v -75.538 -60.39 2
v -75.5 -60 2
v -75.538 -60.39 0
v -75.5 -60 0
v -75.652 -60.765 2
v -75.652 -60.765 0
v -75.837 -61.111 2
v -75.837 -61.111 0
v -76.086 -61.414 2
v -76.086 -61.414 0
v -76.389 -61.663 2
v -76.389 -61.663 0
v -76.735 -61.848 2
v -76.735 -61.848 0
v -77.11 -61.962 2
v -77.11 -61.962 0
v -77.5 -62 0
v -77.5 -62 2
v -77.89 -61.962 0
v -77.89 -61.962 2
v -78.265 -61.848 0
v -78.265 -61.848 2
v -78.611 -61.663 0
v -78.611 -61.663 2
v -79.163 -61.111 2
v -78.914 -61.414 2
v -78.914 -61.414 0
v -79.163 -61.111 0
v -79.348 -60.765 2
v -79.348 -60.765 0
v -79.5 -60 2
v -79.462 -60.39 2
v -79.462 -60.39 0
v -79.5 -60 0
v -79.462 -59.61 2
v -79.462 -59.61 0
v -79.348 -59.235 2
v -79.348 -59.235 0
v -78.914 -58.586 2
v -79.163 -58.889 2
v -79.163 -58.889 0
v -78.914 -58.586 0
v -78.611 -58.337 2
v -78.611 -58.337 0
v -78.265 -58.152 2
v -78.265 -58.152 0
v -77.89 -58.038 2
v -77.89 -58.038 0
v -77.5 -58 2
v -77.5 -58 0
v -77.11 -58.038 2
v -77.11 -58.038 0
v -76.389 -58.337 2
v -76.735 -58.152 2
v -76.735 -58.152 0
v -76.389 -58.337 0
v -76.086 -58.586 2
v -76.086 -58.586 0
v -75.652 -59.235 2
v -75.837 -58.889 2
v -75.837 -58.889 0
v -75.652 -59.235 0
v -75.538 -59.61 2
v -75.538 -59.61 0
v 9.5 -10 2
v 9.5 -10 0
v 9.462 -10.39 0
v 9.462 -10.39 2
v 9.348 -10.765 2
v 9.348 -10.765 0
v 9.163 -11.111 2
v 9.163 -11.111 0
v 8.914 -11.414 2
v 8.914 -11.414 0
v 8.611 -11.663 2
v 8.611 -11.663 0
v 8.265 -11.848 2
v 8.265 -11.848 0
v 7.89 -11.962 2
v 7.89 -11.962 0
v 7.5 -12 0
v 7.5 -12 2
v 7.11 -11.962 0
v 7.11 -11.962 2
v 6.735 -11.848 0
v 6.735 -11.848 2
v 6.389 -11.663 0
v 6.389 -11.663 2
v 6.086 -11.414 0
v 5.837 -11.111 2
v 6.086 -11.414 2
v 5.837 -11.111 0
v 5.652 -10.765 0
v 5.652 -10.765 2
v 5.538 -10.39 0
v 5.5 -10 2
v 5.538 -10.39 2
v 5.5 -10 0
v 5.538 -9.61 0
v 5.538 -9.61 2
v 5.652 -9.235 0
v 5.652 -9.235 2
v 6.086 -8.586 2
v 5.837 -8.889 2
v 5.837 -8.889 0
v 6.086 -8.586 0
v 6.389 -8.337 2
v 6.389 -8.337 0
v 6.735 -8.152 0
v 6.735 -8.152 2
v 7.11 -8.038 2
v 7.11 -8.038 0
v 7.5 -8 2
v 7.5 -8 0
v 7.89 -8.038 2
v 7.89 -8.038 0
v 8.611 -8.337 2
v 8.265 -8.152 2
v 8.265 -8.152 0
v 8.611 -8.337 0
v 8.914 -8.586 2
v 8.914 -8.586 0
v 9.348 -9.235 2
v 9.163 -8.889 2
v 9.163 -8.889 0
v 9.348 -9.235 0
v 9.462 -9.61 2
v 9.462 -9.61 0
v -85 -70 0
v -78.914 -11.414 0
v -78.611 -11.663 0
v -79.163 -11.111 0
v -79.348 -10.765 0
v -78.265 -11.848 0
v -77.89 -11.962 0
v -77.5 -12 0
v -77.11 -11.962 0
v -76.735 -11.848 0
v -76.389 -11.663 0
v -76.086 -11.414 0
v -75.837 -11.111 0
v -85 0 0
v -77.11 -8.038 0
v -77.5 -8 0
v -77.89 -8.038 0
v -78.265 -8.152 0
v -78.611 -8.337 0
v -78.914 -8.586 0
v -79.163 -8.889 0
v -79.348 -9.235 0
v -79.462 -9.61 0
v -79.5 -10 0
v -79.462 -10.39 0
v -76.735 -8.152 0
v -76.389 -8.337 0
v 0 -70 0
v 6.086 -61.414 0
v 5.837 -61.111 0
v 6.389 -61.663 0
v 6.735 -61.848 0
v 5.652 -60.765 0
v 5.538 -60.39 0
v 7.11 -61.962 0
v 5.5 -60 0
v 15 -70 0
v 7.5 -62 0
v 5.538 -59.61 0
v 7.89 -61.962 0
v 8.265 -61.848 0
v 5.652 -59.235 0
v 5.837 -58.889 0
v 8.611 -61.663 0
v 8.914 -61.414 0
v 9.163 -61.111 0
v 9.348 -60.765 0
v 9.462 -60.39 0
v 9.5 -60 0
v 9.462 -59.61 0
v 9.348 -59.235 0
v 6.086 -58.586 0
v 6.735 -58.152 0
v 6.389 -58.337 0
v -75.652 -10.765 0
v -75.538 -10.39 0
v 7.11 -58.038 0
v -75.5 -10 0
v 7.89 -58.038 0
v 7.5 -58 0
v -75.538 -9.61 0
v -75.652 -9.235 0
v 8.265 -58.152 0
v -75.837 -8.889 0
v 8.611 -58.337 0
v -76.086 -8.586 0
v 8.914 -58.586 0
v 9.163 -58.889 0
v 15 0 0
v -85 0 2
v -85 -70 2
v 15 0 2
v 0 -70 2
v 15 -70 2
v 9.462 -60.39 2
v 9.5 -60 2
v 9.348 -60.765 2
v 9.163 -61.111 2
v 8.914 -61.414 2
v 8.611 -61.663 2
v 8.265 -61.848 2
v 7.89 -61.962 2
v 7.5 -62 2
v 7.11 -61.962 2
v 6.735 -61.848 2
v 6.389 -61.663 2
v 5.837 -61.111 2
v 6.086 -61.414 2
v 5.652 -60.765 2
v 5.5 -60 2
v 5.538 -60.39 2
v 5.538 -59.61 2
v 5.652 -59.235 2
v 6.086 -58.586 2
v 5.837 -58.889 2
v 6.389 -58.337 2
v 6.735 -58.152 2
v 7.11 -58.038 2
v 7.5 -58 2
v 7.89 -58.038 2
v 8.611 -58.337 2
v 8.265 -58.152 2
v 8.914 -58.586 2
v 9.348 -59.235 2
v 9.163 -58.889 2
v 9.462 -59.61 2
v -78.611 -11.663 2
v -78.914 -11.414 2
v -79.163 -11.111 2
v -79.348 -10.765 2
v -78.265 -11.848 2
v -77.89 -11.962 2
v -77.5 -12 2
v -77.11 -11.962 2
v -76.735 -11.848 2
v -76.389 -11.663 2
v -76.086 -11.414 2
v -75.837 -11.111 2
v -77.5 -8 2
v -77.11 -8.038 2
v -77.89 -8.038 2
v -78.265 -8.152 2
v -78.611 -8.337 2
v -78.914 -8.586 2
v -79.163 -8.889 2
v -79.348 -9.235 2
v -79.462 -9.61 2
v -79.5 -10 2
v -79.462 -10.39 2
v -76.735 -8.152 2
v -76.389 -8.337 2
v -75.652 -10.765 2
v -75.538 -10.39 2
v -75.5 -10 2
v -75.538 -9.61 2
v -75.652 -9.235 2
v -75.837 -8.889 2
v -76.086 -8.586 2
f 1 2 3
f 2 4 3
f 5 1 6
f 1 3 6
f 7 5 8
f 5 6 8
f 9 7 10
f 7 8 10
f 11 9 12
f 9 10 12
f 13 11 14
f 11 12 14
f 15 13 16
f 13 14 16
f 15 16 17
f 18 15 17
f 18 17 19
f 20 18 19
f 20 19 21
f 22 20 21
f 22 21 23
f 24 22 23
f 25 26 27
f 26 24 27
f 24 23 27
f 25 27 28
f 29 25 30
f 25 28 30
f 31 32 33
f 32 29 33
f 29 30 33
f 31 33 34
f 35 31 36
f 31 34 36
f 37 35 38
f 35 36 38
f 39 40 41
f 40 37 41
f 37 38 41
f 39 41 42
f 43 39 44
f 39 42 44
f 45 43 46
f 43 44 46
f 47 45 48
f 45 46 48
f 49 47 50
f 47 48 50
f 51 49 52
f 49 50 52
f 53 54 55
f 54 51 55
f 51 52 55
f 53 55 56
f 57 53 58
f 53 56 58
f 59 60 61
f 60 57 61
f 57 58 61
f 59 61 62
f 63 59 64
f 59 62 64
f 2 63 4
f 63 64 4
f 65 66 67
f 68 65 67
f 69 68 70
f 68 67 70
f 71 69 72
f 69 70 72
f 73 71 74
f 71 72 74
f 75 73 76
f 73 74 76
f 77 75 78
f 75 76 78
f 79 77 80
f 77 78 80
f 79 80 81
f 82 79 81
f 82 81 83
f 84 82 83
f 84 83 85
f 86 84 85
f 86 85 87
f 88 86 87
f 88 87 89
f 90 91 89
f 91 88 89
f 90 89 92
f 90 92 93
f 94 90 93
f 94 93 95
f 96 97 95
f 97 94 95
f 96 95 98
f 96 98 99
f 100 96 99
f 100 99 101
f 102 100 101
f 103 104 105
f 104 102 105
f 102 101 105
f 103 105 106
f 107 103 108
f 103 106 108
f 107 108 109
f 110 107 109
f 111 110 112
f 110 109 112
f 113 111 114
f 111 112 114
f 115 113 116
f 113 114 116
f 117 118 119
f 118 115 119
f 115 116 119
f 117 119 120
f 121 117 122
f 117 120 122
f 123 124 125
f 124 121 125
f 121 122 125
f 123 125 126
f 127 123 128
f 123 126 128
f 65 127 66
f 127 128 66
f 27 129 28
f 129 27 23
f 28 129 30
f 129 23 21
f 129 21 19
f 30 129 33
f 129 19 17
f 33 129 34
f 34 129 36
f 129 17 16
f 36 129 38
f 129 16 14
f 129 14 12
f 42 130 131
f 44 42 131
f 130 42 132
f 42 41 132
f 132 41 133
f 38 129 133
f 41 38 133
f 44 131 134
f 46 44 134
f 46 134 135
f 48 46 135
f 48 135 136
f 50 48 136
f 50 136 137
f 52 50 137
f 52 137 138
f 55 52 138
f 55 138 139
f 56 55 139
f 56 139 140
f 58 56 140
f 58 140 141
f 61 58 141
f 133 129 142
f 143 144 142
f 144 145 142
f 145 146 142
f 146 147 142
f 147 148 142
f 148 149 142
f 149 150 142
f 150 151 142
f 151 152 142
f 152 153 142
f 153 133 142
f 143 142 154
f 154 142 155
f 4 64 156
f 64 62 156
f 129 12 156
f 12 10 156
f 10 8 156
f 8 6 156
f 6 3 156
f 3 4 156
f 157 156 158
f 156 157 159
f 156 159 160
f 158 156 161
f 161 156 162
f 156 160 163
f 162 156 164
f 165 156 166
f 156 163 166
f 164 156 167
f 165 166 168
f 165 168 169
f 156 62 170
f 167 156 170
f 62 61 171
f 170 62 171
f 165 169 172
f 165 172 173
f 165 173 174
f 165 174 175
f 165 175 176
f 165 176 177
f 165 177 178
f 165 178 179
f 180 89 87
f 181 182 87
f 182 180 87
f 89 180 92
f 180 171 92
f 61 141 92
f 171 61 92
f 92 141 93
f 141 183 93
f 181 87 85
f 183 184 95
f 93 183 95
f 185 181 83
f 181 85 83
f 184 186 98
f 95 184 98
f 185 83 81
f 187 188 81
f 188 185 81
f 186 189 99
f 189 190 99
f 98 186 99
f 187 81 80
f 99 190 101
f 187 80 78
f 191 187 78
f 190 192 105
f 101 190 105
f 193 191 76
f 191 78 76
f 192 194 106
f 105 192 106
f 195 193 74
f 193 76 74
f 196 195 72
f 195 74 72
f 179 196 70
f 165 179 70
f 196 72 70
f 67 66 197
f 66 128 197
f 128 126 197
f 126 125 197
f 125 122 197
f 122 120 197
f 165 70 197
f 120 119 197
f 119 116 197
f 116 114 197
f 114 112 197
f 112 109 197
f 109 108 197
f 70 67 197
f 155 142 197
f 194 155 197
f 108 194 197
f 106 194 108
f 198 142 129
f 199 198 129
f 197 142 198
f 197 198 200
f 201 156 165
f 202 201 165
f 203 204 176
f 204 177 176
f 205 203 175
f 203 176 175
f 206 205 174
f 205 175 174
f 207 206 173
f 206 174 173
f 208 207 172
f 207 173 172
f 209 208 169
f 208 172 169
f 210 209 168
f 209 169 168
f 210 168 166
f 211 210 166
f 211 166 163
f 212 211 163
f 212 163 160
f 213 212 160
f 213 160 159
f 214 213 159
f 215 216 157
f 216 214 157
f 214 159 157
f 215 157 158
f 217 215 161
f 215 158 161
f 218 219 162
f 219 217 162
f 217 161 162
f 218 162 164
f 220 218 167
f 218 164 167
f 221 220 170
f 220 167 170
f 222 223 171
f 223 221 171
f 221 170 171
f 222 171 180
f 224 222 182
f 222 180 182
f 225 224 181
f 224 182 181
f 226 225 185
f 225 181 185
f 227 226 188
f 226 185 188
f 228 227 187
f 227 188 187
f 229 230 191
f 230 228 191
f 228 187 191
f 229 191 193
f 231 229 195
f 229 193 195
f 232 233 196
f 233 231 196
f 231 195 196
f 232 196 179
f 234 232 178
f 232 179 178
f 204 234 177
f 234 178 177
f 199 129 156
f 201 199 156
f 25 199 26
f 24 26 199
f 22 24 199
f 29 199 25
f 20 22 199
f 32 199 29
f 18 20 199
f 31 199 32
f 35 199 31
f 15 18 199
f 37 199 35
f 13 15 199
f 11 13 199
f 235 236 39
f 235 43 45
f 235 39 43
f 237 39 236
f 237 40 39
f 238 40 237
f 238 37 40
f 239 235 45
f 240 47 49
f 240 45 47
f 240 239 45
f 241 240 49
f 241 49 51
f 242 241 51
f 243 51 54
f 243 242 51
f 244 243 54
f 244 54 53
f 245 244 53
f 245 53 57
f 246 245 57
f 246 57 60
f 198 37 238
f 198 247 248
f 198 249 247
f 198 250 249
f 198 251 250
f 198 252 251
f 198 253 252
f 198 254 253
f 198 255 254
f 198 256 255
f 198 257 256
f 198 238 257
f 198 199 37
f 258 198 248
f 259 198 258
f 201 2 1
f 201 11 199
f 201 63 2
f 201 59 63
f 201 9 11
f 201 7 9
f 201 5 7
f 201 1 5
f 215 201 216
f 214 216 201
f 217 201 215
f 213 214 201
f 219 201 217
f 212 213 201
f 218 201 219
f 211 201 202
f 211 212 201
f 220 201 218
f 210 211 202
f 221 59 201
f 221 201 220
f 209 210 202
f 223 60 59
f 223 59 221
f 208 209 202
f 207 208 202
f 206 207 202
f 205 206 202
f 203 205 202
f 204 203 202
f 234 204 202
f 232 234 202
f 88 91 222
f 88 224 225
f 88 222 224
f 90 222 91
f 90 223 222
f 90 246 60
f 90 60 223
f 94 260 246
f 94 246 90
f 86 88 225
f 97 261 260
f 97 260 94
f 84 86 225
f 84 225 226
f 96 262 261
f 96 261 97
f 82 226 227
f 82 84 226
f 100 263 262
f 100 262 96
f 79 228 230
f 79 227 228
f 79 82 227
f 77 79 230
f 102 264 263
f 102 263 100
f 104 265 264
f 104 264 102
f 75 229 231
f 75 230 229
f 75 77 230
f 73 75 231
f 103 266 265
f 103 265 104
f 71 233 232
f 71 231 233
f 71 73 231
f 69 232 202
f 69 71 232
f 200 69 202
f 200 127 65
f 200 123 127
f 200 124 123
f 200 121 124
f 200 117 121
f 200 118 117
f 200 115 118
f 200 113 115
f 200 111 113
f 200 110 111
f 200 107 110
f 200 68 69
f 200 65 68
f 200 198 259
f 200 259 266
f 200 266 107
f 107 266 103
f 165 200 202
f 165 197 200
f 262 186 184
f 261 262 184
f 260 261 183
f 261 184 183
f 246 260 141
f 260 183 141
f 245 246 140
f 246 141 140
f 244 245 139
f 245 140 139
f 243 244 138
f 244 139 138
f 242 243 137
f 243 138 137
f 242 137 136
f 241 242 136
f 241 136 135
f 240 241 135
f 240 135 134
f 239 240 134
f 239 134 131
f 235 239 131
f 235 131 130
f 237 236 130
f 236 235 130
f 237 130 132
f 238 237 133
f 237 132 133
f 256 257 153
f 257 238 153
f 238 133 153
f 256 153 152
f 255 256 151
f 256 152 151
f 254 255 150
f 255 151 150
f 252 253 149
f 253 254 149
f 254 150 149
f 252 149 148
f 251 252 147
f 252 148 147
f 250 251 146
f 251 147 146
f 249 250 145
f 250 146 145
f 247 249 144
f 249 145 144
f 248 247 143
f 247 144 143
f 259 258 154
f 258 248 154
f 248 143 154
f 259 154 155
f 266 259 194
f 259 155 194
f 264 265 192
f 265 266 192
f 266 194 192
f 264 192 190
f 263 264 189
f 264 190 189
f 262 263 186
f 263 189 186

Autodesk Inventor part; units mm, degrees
ref_plane "YZ Plane" through (0, 0, 0) normal (1, 0, 0) x (0, 1, 0)
ref_plane "XZ Plane" through (0, 0, 0) normal (0, 1, 0) x (-1, 0, 0)
ref_plane "XY Plane" through (0, 0, 0) normal (0, 0, 1) x (1, 0, 0)
sketch "Sketch1" plane through (0, 0, 0) normal (0, 0, 1) x (1, 0, 0)
  circle A0 centre (7.5, -10) radius 2 projected
  circle A1 centre (7.5, -60) radius 2 projected
  line L0 (0, 0) -> (0, -69.9999) projected
  line L1 (0, -69.9999) -> (15, -69.9999) projected
  line L2 (15, 0) -> (15, -69.9999) projected
  line L3 (0, 0) -> (15, 0) projected
  line L4 (15, 0) -> (-85, 0)
  line L5 (-85, 0) -> (-85, -70)
  line L6 (-85, -70) -> (15, -70)
  line L7 (15, -70) -> (15, 0)
  circle A2 centre (-77.5, -10) radius 2 projected
  circle A3 centre (-77.5, -60) radius 2 projected
  line L8 (-85, 0) -> (-85, -69.9999) projected
  line L9 (-85, -69.9999) -> (-70, -69.9999) projected
  line L10 (-70, 0) -> (-70, -69.9999) projected
  line L11 (-85, 0) -> (-70, 0) projected
  dimension "d0" = 100
  dimension "d1" = 70
extrude "Extrusion1" add sketch "Sketch1" along normal blind 2
properties part number "Copper_Plate" material "Copper"
